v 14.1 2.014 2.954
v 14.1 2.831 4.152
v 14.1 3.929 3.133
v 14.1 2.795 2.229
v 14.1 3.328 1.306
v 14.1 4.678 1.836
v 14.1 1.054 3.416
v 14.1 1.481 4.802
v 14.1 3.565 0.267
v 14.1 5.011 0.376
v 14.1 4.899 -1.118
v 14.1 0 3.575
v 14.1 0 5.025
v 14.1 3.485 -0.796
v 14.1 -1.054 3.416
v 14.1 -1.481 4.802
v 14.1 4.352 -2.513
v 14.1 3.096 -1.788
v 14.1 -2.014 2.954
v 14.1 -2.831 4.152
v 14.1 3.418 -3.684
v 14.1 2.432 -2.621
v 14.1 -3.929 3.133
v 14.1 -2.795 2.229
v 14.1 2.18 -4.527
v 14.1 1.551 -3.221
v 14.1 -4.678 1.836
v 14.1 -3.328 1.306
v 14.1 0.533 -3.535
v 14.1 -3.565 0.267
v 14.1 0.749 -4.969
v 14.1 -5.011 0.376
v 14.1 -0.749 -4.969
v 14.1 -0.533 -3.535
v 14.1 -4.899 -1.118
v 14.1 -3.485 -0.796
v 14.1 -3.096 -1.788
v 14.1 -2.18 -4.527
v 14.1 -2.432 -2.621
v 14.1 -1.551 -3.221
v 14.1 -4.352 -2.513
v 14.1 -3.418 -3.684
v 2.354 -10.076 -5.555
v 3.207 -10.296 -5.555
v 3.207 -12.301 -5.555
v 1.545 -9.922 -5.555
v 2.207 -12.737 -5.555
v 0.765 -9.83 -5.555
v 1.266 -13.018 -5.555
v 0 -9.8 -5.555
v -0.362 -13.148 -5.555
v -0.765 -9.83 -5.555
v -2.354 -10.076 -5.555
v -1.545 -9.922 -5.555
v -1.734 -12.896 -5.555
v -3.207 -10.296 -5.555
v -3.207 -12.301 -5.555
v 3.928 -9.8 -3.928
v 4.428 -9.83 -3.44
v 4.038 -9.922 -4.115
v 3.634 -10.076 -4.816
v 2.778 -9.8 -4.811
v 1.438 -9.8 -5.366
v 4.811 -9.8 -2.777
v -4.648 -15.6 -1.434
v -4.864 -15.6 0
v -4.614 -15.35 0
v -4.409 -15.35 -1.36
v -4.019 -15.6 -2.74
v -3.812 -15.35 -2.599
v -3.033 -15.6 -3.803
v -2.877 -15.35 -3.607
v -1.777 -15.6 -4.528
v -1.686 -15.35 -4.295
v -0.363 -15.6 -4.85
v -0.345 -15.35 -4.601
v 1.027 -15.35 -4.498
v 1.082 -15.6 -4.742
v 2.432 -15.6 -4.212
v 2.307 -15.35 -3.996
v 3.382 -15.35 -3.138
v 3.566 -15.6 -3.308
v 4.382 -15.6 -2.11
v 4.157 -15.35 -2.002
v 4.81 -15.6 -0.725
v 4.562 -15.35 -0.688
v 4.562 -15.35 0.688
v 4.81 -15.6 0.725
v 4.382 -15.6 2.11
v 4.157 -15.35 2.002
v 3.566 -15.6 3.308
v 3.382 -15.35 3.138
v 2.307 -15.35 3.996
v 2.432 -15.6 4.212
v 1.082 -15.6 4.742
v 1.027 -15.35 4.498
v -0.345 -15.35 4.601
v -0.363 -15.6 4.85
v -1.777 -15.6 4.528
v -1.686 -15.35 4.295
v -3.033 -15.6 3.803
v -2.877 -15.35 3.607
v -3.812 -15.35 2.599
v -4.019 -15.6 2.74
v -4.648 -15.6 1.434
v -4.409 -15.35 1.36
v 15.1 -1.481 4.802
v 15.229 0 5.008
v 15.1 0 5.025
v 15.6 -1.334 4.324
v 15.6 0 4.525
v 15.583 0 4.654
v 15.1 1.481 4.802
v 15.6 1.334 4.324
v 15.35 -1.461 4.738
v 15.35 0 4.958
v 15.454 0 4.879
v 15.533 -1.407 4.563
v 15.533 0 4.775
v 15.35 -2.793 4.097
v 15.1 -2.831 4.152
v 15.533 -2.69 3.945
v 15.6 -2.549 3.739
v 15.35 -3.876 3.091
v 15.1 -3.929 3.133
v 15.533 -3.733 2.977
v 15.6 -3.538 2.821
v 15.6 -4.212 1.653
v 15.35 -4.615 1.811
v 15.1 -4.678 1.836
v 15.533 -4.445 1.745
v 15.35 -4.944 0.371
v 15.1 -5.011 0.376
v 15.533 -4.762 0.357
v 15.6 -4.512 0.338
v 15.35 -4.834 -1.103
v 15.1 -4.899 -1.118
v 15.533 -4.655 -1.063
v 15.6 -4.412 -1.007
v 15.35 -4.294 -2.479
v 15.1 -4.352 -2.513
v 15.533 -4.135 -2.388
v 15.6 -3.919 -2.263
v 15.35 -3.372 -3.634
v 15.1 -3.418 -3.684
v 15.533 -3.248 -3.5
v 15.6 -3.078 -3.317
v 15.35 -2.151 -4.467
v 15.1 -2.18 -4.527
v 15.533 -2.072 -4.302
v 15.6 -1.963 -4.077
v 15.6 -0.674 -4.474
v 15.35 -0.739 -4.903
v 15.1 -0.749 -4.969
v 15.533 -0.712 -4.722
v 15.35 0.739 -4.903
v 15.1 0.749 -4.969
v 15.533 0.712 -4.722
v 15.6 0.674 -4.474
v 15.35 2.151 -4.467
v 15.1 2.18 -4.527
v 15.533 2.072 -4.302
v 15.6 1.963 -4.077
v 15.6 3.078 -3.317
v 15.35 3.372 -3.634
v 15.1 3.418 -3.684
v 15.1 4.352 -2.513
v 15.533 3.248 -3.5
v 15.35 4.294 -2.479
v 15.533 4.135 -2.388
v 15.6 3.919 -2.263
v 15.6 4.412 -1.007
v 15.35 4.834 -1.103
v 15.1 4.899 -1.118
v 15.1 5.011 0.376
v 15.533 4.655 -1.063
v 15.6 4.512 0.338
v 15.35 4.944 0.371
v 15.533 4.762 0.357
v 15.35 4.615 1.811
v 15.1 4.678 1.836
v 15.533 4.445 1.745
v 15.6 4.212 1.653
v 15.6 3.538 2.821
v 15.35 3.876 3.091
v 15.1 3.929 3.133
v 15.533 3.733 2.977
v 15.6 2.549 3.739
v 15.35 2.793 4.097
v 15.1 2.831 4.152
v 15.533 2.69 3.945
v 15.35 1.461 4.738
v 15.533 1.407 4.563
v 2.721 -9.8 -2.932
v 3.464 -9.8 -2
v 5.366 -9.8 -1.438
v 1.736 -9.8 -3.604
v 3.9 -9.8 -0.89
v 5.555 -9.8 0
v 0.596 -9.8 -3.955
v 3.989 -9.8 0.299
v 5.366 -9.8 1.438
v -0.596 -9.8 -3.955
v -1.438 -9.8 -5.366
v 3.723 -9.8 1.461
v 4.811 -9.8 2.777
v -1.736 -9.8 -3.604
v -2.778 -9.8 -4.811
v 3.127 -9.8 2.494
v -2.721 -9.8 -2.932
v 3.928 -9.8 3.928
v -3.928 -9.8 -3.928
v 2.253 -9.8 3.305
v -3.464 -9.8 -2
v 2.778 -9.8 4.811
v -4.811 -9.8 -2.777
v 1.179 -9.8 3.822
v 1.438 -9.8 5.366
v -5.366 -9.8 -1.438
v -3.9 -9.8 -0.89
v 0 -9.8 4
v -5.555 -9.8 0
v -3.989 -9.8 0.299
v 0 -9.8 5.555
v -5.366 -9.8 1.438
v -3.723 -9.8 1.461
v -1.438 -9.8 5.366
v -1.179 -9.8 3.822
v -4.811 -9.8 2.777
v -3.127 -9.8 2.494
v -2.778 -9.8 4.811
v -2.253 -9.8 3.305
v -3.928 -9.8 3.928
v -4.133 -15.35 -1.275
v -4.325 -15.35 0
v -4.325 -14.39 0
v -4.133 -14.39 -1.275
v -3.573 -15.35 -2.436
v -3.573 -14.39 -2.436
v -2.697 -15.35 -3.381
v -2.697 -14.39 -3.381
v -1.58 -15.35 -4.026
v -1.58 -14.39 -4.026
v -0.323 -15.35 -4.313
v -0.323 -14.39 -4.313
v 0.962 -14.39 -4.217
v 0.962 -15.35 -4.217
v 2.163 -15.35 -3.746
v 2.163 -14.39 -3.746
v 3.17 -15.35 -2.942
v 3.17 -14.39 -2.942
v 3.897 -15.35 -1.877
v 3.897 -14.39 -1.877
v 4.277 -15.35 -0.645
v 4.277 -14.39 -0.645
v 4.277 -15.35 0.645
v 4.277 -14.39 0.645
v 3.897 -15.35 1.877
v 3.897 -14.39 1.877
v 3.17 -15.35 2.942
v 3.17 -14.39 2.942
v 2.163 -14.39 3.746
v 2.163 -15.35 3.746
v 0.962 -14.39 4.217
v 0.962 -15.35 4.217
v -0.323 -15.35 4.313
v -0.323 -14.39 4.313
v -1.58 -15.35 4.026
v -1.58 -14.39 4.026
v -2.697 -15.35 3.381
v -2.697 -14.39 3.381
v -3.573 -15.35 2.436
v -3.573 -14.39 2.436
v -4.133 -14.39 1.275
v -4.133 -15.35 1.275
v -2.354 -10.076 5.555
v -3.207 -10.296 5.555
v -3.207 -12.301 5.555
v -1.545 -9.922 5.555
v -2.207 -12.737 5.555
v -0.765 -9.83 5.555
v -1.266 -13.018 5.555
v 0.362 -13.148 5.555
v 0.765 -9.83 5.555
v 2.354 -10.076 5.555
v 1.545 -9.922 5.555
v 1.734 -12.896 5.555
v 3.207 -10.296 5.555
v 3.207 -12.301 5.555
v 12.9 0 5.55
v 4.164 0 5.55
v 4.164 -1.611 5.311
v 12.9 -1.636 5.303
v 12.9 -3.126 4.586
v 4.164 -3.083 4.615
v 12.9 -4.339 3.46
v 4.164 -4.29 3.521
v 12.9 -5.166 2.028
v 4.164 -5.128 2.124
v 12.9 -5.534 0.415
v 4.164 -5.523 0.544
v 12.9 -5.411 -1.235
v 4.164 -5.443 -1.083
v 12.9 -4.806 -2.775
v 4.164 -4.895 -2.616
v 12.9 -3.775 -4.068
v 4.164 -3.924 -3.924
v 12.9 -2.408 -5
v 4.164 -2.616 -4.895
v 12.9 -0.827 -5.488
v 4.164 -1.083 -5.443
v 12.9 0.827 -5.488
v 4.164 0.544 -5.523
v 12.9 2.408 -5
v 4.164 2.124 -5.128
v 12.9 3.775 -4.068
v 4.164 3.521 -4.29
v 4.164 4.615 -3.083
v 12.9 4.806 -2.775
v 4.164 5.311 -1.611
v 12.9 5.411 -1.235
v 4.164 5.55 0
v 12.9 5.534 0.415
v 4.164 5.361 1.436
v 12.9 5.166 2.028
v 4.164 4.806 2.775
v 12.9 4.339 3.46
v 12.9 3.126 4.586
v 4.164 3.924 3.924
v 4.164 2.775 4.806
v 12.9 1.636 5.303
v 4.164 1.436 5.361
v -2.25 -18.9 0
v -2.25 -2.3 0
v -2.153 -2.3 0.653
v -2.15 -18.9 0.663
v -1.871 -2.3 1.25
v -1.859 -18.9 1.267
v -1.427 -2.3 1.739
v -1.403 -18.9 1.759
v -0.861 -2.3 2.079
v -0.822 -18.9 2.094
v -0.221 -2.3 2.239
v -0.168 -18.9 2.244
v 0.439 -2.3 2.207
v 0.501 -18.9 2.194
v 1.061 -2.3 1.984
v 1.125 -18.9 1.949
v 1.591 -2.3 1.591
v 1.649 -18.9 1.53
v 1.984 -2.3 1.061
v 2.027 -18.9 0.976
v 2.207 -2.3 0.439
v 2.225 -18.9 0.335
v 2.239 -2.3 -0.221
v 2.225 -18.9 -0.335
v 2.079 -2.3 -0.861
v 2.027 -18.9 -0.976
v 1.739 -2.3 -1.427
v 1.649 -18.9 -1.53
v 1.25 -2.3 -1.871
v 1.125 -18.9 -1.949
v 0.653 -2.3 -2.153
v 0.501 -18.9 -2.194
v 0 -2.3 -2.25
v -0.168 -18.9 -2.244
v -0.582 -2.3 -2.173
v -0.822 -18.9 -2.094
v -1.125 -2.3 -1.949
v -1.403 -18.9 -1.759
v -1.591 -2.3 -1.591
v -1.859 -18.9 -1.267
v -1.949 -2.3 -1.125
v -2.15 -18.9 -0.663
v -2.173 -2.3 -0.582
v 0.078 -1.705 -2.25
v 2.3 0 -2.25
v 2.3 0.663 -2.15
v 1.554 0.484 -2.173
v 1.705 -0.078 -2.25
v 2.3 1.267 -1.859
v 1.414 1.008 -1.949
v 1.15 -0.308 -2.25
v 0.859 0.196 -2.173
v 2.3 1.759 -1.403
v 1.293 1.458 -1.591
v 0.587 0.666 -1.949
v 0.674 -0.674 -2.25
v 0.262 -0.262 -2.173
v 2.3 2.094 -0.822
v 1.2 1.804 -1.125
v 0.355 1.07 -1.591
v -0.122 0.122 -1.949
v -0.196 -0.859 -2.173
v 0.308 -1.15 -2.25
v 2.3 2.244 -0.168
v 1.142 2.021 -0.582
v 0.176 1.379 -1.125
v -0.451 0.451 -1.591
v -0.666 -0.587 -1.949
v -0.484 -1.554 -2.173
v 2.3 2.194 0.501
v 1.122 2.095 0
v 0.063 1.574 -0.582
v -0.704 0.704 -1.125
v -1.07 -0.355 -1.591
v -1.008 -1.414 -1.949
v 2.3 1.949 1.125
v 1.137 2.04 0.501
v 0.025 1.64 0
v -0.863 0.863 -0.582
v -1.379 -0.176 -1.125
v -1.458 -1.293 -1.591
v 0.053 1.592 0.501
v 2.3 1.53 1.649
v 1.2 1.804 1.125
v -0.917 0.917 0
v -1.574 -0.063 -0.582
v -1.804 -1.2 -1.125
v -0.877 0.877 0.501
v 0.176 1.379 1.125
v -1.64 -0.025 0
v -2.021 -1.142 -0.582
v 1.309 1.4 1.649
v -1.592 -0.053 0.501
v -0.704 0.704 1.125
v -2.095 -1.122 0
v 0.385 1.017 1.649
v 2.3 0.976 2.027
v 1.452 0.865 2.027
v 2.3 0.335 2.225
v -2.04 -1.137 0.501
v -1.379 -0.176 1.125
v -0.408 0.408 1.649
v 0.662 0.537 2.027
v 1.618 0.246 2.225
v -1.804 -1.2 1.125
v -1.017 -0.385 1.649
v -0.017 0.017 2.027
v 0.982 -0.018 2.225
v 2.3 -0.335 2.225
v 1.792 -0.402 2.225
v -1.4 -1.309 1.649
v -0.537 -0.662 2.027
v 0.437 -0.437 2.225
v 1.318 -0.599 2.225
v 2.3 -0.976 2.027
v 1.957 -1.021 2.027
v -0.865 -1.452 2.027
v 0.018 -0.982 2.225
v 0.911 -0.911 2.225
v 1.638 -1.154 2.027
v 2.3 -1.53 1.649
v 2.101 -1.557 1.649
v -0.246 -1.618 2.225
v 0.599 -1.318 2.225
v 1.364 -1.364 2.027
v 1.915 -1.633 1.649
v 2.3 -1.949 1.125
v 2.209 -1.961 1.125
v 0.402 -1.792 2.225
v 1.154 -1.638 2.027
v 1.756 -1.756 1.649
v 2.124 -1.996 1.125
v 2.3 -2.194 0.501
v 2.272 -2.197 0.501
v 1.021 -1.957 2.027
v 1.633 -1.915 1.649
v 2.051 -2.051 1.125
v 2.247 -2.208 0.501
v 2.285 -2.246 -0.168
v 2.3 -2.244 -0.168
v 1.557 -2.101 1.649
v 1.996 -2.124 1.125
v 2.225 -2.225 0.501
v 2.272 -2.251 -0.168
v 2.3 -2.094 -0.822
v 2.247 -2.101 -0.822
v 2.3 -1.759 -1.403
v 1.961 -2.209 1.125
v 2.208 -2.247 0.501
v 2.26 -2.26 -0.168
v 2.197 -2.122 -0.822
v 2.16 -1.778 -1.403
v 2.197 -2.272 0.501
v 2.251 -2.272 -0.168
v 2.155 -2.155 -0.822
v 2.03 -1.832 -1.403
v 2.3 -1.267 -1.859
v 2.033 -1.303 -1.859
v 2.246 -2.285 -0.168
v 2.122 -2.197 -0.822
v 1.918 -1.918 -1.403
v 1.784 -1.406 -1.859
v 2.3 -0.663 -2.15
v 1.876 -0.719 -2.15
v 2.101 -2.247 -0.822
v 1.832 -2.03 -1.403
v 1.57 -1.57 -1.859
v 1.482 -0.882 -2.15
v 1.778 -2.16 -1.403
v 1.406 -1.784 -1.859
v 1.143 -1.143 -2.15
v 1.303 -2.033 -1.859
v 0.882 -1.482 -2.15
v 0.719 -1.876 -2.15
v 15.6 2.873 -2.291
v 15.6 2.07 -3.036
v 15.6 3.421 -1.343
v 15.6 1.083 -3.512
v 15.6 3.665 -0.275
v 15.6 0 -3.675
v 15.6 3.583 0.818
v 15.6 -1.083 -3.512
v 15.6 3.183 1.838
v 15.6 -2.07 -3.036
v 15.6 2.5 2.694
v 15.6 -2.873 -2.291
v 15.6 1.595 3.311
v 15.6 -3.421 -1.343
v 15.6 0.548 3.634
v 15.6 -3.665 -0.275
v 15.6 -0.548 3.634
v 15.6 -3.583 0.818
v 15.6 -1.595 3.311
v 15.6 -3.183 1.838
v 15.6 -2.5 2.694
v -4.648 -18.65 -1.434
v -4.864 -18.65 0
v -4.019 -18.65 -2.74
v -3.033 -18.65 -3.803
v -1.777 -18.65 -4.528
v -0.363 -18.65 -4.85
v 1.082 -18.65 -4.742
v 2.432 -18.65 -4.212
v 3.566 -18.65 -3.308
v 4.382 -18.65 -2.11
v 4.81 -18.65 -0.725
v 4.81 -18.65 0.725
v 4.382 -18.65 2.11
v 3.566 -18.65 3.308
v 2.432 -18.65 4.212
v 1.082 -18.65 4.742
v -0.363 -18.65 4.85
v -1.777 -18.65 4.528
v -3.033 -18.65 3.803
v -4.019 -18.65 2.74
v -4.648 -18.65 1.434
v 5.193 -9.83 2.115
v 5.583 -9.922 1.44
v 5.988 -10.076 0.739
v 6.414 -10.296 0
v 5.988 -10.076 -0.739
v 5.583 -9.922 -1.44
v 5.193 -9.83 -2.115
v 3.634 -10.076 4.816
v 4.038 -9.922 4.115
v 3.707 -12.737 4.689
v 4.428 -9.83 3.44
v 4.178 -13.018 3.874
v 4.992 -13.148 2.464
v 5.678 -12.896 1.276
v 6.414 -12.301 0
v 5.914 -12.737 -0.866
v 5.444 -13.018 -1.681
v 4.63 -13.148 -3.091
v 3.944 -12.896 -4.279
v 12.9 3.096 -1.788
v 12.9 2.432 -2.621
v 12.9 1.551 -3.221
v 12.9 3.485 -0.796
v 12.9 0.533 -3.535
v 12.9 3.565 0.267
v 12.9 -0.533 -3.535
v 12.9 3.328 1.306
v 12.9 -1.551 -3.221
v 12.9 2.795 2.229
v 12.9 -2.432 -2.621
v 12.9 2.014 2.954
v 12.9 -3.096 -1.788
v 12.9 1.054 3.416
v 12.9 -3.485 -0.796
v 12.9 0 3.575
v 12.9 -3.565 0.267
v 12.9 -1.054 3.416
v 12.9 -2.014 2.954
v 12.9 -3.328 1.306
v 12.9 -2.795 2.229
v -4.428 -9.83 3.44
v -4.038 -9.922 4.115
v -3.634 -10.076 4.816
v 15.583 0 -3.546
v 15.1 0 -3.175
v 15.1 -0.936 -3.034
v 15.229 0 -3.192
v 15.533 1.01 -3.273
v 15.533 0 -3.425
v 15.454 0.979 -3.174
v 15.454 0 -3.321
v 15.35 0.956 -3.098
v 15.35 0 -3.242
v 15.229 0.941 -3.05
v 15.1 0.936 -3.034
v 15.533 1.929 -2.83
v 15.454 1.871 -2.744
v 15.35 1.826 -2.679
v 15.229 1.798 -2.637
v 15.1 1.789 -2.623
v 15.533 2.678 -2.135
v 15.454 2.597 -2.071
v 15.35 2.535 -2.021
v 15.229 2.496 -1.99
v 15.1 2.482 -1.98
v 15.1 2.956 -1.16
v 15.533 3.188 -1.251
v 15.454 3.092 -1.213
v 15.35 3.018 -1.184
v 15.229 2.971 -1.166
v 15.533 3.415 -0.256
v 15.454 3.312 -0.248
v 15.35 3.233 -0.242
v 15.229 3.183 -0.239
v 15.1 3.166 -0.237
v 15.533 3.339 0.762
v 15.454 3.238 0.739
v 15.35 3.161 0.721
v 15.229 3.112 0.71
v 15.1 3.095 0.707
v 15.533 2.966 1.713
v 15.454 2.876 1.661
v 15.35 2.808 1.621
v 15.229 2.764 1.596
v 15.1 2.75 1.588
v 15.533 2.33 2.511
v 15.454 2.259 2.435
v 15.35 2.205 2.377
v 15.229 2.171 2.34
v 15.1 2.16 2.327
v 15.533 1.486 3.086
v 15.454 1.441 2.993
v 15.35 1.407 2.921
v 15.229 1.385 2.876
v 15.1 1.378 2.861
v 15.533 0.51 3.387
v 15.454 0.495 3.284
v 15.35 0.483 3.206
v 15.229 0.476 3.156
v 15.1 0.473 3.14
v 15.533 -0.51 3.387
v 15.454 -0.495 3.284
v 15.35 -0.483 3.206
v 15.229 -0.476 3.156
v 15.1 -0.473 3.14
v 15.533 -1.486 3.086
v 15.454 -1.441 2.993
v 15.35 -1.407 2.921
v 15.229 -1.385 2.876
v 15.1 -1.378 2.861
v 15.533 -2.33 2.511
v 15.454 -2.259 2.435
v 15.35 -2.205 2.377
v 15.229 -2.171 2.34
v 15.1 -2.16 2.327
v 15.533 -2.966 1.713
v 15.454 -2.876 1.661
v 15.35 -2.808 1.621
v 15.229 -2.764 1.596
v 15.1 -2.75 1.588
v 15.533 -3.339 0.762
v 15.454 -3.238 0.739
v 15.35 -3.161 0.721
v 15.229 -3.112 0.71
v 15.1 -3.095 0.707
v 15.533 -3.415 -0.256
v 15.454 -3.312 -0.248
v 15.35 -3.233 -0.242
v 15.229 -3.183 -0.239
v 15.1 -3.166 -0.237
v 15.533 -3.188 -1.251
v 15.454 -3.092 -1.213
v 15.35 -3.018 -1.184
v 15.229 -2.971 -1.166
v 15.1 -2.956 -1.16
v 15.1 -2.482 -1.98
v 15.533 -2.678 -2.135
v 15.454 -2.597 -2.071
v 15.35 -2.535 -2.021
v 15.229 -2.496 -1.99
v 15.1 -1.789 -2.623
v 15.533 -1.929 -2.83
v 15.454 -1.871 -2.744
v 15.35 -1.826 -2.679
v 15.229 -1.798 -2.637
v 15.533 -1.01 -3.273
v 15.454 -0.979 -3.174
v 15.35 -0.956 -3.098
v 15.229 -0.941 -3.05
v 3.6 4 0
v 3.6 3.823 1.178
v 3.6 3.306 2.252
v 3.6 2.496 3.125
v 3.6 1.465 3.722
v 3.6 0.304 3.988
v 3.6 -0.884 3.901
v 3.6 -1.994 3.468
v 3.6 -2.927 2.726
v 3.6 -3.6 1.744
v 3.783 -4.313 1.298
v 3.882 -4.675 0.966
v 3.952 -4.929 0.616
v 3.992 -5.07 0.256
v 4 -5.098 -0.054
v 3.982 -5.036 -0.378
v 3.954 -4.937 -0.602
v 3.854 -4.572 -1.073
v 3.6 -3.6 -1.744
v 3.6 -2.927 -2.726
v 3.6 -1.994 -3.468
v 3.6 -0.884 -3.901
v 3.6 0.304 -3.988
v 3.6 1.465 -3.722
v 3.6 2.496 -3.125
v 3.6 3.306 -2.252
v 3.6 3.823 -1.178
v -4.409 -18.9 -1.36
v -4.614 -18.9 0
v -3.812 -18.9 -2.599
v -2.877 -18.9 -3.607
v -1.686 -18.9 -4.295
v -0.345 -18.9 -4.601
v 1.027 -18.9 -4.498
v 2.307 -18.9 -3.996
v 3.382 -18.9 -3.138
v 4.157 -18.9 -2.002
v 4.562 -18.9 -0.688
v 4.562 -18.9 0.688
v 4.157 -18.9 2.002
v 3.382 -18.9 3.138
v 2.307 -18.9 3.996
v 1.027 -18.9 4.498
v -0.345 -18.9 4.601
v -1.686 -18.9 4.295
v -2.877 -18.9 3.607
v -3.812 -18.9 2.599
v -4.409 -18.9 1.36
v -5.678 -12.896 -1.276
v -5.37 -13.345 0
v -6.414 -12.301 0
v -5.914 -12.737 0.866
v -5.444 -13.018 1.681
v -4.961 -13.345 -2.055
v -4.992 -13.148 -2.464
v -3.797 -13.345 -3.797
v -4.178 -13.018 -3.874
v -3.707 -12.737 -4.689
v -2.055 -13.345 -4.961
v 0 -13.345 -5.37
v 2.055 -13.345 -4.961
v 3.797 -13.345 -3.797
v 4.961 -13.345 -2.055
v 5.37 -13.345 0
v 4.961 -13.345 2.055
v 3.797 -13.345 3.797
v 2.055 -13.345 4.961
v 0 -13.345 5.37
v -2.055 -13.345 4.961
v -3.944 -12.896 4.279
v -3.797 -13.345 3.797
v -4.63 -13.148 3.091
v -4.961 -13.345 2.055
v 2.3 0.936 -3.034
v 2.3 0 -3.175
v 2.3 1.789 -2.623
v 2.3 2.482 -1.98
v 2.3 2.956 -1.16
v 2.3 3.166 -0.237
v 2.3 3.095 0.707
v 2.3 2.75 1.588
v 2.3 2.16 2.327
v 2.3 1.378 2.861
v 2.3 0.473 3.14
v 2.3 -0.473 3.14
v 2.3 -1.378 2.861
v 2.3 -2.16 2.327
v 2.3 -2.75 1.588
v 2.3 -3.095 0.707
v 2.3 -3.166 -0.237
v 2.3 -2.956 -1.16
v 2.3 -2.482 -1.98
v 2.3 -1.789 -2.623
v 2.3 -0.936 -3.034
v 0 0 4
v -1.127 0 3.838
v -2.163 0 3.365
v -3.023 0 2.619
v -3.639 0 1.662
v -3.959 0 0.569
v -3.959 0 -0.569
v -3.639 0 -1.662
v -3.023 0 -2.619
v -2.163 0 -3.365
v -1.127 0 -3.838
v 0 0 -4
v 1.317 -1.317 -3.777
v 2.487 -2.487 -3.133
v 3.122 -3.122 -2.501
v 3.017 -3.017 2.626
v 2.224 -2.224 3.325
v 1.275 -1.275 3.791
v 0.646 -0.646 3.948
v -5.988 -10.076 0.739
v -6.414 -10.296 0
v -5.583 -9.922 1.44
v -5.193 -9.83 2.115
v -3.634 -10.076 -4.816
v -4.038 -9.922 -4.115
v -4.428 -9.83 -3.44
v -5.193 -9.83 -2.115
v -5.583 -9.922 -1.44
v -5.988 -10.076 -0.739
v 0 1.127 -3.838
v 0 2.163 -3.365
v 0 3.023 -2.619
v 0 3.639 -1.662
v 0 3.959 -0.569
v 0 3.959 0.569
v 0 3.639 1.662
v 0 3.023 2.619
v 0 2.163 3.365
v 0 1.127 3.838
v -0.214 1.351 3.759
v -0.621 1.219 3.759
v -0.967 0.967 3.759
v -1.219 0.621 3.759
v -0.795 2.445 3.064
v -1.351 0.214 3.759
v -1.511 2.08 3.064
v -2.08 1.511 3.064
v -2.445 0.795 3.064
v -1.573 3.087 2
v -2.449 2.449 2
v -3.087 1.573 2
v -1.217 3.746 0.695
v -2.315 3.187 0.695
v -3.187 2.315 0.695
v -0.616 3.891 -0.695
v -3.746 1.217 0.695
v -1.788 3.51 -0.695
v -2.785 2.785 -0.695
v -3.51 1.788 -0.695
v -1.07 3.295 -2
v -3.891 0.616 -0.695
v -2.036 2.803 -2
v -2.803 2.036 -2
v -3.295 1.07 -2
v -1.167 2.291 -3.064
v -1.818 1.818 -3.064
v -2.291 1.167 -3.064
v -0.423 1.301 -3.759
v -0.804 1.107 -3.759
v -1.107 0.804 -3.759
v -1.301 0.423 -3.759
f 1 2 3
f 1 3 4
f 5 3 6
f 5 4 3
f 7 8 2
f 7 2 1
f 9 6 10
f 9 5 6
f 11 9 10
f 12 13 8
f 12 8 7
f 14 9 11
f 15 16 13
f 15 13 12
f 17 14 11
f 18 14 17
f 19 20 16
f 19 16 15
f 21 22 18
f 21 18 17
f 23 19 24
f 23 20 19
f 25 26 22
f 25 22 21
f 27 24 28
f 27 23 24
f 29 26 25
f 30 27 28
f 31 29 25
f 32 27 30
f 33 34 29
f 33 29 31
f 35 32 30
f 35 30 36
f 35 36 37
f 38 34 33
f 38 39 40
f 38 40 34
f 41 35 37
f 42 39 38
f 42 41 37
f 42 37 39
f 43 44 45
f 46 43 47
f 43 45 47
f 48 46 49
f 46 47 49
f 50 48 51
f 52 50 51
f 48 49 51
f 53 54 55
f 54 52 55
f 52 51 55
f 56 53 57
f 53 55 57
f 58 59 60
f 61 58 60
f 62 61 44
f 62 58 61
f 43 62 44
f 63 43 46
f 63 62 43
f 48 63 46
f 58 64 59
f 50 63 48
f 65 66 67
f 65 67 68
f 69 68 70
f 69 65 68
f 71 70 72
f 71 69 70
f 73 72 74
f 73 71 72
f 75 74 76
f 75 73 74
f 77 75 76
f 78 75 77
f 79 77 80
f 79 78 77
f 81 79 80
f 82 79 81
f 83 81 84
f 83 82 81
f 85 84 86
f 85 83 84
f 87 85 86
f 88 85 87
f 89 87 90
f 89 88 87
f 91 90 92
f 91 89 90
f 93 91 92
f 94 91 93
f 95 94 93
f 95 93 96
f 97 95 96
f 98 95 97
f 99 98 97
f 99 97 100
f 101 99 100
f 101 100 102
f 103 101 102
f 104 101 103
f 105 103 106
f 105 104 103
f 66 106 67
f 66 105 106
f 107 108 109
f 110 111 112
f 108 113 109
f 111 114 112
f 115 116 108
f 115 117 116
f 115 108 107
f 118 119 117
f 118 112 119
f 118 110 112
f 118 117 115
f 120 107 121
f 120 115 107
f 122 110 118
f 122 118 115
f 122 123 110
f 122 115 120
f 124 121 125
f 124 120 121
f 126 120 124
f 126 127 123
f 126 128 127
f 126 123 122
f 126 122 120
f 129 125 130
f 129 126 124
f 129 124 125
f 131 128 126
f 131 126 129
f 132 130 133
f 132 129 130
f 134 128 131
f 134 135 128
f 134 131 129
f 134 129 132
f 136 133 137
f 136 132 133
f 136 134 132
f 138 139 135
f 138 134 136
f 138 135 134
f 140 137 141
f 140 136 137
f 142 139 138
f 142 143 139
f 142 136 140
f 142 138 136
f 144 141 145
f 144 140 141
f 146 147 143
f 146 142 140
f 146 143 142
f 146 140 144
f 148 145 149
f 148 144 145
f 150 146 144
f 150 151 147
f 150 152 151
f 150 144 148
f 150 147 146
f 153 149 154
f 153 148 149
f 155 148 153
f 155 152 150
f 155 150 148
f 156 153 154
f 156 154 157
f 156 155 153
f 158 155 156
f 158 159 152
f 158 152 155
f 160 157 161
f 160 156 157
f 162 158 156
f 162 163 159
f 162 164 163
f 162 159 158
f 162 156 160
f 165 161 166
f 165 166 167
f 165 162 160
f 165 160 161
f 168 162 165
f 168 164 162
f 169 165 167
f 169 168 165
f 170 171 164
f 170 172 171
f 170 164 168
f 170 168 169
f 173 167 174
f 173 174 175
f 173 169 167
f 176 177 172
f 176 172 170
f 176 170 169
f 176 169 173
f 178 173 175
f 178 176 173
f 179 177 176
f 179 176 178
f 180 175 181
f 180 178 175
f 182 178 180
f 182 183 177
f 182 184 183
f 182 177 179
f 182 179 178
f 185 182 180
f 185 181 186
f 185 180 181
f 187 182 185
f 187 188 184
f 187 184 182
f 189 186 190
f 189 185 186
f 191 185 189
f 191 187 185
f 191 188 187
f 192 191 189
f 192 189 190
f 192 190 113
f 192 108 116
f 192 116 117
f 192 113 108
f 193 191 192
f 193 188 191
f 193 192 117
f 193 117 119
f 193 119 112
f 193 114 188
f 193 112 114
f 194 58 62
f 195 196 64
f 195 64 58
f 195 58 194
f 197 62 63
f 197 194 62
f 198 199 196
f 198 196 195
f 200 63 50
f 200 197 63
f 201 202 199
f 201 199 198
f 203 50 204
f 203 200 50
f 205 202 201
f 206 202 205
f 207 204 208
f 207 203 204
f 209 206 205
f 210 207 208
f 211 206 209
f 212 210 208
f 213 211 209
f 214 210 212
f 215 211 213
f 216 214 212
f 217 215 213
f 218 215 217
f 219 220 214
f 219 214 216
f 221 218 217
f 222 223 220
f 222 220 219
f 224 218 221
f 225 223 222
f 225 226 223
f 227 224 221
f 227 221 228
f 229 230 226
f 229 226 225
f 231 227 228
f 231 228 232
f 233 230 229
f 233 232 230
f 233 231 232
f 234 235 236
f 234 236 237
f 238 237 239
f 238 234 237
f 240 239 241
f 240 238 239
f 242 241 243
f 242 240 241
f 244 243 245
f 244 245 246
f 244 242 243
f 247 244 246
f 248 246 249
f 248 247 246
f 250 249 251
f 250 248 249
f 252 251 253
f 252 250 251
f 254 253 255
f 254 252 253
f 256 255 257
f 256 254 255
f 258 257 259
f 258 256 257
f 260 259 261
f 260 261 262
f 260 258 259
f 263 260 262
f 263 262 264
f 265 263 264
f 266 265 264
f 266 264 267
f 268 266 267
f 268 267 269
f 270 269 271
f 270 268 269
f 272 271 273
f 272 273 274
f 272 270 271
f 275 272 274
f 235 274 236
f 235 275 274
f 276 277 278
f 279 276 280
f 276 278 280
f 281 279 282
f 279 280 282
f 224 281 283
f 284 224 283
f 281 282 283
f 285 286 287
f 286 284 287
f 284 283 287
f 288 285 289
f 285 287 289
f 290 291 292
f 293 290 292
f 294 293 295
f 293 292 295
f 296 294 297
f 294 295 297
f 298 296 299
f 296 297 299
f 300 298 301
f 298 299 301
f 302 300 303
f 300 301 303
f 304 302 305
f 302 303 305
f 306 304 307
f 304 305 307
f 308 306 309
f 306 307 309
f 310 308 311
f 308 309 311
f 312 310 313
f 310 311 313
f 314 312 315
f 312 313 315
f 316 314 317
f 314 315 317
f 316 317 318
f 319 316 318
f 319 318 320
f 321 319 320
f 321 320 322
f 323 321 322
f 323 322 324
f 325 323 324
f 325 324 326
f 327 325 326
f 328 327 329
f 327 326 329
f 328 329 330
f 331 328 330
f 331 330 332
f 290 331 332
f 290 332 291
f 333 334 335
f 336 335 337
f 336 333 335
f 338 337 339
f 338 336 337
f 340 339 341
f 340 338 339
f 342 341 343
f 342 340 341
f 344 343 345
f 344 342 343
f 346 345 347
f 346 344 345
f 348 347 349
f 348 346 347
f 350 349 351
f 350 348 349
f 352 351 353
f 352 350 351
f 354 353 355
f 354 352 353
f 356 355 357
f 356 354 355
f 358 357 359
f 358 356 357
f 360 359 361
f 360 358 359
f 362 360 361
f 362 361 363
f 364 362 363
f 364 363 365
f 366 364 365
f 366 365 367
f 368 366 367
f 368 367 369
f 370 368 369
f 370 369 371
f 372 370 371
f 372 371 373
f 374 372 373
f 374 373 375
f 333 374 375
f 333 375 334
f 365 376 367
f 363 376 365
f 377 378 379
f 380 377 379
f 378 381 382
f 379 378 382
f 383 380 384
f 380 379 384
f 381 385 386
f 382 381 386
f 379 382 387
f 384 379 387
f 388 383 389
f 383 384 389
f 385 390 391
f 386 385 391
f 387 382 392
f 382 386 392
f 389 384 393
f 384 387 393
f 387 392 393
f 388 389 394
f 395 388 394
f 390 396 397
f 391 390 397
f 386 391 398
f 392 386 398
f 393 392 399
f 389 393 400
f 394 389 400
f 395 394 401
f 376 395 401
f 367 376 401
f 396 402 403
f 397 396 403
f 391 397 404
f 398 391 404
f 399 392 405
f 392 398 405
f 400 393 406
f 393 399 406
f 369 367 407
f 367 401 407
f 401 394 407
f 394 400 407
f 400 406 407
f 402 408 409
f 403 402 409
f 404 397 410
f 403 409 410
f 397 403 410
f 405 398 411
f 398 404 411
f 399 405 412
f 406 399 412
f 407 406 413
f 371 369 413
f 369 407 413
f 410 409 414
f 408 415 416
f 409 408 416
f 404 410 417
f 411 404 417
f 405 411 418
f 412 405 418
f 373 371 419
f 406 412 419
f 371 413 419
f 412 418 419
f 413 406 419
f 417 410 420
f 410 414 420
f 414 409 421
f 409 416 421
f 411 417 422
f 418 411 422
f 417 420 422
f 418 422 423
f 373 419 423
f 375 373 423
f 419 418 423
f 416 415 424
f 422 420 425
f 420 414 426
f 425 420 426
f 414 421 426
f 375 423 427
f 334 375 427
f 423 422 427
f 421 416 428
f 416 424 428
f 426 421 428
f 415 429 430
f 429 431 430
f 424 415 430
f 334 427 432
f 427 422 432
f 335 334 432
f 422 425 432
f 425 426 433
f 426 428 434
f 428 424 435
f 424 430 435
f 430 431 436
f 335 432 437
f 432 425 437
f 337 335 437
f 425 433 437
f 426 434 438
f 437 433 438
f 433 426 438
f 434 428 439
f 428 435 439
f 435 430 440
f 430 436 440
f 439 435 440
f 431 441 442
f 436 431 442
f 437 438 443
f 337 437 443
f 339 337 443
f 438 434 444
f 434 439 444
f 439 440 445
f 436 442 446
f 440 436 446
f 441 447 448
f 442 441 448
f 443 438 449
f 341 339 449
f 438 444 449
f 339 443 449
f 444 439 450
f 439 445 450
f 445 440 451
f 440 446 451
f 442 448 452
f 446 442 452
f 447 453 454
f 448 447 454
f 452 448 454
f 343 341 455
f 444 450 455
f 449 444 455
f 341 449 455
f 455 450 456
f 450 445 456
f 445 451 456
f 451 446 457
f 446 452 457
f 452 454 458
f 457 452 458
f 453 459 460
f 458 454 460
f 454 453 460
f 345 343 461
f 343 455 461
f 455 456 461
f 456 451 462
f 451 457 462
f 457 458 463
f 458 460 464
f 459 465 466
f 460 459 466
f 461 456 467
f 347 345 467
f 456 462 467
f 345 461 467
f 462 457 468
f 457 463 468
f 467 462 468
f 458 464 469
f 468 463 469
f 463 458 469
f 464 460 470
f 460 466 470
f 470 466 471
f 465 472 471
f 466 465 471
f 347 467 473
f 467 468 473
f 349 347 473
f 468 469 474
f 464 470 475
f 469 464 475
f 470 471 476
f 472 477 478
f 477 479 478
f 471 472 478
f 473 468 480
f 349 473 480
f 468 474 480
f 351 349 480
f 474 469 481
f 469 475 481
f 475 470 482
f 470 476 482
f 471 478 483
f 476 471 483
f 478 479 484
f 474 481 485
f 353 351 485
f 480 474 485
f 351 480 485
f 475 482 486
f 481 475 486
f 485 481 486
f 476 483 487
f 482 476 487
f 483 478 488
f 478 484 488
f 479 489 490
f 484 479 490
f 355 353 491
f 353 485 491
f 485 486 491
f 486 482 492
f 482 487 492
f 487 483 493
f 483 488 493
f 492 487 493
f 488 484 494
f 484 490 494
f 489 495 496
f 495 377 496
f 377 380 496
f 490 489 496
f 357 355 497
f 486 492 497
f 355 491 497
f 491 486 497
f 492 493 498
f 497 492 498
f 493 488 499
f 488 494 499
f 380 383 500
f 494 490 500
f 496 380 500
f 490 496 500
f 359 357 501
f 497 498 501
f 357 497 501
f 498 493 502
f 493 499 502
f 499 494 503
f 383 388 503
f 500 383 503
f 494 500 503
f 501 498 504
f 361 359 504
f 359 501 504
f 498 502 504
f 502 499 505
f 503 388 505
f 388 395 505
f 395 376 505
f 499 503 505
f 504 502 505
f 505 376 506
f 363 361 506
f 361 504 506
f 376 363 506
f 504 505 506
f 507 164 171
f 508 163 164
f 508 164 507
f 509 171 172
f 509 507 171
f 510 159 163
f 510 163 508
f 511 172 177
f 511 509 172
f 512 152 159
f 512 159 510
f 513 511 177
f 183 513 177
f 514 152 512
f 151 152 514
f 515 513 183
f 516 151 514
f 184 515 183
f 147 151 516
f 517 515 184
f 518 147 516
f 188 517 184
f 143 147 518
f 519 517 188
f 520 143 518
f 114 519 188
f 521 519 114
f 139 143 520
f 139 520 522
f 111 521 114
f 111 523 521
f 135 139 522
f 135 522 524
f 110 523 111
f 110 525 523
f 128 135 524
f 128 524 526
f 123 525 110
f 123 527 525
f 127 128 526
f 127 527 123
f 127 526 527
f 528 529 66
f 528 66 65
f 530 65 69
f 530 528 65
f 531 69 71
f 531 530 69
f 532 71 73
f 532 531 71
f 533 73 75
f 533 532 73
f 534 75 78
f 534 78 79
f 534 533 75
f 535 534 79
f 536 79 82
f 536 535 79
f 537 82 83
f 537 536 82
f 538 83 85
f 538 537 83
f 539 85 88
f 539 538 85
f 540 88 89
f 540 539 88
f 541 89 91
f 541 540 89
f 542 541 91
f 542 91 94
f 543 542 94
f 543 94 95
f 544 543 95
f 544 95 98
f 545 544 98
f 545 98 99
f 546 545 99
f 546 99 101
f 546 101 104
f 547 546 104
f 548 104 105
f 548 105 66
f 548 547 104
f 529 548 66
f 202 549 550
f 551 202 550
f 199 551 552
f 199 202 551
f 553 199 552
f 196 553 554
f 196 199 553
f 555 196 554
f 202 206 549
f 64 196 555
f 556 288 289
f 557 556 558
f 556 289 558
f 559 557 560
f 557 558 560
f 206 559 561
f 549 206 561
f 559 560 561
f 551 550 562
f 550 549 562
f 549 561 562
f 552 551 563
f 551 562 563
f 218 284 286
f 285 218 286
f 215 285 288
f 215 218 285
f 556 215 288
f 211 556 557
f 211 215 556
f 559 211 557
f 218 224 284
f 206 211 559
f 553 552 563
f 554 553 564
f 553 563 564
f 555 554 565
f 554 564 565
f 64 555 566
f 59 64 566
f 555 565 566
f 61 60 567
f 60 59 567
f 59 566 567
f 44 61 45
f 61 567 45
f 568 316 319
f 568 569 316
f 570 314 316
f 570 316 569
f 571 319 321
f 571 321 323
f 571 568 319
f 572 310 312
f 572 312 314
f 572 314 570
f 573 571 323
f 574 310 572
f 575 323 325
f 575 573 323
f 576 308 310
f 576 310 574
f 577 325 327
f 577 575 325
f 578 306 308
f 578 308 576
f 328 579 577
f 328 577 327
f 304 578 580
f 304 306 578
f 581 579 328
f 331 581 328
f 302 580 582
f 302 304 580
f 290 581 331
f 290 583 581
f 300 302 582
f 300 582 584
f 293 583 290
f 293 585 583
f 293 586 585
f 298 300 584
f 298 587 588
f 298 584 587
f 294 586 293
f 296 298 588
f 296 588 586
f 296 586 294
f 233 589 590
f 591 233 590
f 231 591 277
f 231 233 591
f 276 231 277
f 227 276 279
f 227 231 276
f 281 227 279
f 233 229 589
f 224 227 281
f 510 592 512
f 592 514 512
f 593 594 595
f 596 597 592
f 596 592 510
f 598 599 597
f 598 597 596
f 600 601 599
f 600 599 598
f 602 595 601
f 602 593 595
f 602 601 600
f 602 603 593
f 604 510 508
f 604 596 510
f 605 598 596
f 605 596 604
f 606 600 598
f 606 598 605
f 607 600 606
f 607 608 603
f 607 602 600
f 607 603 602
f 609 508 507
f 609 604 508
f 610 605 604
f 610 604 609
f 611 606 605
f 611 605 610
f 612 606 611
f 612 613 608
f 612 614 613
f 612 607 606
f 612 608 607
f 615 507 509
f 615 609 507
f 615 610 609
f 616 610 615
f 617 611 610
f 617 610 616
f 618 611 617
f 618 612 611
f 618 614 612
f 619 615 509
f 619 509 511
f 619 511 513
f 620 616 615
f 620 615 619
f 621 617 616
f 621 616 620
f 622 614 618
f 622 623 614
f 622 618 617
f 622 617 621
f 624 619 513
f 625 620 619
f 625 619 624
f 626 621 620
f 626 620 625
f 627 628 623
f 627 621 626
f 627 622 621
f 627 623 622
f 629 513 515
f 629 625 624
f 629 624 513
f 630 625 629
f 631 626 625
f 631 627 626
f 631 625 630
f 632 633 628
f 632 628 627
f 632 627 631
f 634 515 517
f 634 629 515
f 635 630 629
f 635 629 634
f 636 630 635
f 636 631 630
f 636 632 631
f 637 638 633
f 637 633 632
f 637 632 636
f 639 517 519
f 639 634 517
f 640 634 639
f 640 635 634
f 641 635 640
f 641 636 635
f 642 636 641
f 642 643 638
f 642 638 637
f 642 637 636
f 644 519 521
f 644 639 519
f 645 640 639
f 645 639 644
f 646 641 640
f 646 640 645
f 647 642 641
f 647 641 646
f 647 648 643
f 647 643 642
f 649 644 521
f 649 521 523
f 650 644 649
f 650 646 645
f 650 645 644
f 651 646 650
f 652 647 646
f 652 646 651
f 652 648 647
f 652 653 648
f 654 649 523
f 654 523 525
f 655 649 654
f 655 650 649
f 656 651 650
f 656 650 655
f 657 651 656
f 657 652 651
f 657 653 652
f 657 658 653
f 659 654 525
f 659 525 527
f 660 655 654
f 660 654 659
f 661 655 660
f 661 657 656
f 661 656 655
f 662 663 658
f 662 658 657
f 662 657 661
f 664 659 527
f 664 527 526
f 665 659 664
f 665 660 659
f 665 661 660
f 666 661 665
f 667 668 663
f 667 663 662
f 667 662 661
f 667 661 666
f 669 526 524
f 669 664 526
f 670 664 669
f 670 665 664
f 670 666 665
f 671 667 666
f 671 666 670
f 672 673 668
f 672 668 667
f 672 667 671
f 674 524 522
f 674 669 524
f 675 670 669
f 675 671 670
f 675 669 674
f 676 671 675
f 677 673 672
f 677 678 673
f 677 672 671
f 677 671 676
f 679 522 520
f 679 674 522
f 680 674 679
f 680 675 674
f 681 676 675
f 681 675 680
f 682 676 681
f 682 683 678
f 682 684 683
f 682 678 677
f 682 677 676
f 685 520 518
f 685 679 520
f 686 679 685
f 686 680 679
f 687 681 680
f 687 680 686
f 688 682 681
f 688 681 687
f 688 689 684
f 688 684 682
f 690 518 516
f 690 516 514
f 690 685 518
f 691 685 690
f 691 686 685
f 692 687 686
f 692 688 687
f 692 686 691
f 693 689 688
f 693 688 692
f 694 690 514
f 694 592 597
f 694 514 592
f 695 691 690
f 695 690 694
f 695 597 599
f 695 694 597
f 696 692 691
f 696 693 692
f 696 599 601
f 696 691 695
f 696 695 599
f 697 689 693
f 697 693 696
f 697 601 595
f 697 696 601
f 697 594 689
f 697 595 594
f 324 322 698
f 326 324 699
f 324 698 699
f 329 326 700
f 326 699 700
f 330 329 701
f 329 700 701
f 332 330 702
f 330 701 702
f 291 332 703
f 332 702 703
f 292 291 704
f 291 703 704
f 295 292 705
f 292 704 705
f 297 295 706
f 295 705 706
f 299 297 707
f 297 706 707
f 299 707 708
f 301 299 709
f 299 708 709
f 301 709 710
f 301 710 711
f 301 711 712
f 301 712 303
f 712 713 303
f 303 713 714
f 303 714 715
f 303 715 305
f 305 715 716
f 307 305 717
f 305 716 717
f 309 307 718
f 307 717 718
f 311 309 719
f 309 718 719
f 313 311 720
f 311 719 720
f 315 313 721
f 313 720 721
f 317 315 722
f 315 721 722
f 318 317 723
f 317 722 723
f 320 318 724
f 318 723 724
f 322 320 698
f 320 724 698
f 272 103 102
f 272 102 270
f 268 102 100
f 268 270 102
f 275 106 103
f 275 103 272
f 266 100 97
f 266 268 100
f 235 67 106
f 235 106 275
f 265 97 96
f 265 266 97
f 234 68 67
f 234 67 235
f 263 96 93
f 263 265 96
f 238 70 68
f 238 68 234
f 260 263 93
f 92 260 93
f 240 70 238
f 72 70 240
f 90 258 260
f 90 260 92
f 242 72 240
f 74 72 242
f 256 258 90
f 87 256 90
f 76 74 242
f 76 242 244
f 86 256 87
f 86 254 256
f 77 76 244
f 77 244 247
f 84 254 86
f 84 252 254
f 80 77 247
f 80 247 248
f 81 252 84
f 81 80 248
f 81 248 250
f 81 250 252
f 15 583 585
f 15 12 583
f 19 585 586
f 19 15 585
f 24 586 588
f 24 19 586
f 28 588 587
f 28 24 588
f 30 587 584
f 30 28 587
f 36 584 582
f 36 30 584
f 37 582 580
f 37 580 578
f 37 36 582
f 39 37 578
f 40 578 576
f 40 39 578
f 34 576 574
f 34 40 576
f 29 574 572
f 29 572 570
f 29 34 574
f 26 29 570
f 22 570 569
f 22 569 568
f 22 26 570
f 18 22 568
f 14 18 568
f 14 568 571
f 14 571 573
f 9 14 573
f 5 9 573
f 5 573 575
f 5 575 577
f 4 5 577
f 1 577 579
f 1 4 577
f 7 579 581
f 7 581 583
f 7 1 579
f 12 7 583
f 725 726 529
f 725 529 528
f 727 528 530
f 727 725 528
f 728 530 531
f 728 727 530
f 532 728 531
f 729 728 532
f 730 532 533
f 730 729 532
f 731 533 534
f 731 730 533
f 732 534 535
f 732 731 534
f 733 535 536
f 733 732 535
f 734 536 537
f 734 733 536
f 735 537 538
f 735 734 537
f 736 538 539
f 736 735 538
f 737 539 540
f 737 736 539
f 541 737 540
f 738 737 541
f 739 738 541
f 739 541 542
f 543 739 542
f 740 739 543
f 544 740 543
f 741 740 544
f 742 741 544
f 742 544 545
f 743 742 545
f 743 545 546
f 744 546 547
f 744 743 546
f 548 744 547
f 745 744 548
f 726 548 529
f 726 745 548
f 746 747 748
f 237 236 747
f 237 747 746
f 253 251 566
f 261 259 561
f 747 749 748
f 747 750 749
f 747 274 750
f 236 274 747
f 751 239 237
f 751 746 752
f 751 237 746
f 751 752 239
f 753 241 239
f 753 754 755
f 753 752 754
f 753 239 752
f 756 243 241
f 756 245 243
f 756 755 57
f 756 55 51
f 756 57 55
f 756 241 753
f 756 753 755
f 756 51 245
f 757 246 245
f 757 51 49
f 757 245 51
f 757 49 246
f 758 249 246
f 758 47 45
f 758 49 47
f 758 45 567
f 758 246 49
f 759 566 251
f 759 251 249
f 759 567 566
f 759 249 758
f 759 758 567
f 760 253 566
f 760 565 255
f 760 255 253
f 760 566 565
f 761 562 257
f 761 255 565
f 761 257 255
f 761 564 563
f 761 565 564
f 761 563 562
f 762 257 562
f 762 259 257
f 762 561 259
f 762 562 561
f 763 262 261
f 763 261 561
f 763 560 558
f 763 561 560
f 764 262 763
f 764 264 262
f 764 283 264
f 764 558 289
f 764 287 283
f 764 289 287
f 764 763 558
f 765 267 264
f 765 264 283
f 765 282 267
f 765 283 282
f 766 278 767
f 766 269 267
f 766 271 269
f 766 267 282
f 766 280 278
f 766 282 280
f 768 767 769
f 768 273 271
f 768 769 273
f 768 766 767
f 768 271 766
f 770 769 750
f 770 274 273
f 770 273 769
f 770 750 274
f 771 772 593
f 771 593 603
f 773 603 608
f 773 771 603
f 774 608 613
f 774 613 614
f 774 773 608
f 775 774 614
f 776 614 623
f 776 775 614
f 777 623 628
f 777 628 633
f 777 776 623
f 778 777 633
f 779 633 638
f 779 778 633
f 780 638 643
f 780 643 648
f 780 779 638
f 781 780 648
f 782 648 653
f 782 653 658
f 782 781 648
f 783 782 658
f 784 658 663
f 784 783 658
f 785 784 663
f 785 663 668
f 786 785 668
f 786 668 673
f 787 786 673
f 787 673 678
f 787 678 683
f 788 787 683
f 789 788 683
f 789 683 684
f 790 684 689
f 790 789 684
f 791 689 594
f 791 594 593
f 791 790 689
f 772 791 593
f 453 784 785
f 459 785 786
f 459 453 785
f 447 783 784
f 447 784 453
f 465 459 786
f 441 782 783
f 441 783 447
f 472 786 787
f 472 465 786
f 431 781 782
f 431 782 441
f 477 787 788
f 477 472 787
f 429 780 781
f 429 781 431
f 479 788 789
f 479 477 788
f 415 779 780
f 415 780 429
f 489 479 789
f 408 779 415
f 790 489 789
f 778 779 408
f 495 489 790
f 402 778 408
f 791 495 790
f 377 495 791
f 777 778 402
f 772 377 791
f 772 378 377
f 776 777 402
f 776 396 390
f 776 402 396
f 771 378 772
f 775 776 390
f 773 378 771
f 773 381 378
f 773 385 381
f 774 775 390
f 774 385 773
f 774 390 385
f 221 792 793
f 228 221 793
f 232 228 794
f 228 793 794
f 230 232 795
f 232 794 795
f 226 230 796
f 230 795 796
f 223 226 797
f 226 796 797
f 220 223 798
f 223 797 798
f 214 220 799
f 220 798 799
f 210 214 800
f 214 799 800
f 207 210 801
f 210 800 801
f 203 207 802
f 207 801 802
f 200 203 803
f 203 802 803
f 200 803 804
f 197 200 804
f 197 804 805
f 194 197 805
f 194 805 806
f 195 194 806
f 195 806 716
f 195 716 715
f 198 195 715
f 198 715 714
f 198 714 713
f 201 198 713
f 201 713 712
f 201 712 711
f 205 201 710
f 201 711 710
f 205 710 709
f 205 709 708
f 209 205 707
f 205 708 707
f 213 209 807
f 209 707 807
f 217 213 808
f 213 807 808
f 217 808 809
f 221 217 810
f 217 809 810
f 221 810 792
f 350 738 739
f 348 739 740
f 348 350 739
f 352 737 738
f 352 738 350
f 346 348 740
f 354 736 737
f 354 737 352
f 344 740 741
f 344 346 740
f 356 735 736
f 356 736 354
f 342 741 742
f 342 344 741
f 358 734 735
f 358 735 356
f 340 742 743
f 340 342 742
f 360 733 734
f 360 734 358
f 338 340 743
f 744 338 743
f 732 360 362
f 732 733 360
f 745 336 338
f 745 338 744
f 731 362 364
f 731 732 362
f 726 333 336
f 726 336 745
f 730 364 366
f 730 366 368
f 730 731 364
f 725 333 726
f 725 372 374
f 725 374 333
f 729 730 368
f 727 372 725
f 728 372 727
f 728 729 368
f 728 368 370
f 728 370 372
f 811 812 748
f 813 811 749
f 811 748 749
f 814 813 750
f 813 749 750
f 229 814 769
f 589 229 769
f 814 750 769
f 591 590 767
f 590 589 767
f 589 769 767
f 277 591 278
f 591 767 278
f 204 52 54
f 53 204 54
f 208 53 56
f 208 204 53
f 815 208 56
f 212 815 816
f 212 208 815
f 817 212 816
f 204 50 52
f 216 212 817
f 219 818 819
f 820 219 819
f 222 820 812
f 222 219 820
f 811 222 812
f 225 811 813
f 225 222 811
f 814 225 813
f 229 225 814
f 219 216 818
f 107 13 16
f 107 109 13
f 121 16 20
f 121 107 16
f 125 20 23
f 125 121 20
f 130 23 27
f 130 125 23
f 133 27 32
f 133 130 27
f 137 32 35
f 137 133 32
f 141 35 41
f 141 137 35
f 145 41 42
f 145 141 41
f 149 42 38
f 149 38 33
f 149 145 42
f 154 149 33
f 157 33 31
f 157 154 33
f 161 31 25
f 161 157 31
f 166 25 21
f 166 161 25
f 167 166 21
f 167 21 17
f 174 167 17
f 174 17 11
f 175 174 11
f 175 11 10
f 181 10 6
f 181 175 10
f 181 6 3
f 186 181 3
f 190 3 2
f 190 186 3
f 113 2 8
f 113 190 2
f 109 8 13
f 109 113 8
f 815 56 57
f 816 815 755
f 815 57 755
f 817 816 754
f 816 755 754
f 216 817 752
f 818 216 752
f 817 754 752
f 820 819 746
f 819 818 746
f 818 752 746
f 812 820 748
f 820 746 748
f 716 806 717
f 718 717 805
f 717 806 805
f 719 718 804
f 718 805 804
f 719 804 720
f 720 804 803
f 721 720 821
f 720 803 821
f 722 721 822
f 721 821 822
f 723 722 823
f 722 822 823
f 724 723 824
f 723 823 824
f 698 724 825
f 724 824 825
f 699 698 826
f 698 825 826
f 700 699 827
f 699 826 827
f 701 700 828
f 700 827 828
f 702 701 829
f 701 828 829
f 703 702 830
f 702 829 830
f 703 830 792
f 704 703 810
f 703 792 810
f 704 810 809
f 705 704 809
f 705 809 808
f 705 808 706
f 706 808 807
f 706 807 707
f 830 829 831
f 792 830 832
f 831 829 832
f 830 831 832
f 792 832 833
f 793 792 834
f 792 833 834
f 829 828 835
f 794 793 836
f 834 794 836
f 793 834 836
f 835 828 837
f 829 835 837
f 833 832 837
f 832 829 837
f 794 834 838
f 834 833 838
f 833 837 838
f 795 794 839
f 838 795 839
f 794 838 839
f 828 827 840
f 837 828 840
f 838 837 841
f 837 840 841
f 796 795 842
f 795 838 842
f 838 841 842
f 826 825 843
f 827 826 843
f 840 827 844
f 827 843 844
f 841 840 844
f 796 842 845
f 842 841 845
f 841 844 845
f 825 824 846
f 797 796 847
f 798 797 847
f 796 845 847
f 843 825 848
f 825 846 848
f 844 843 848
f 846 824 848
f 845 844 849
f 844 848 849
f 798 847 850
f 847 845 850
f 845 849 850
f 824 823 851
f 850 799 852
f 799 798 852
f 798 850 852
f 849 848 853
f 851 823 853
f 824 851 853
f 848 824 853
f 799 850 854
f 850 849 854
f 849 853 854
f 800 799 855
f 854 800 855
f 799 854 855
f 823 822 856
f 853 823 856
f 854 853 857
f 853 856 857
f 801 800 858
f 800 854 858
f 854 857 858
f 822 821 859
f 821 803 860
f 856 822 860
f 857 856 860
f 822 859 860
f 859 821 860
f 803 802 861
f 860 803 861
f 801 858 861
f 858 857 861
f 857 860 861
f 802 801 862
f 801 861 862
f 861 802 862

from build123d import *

# Parameters (mm, degrees)
SKETCH1_R             = 4
BASE_EXTRUDE_DEPTH    = 3.6
RBODY_SKETCH_R        = 5.55
RBODY_DEPTH           = 9.3
ELBOW_ANGLE           = 90
SKETCH3_R             = 4
BOSS_EXTRUDE1_DEPTH   = 9.8
NUT_DEPTH             = 4.59
THREAD_CHAMFER_SIZE   = 0.25
RTUBE_START           = -13.3
RTUBE_SKETCH_R        = 3.175
RTUBE_DEPTH           = 13.3
RTUBE_RADIUS_R        = 0.5
DIAMETER_R            = 2.25
PORT_THREADS_REACH    = 31.53
PORT_THREADS_SKETCH_R = 2.25


with BuildPart() as part:
    # Sketch1 → Base-Extrude (new body)
    with BuildSketch(Plane(origin=(0, 0, 0), x_dir=(0, 0, -1), z_dir=(1, 0, 0))):
        with Locations(Location((0, 0, 0), (0, 0, 180))):
            Circle(SKETCH1_R)
    extrude(amount=BASE_EXTRUDE_DEPTH)

    # RBody_Sketch → RBody (add)
    with BuildSketch(Plane(origin=(3.6, 0, 0), x_dir=(0, 0, -1), z_dir=(1, 0, 0))):
        with Locations(Location((0, 0, 0), (0, 0, 180))):
            Circle(RBODY_SKETCH_R)
    extrude(amount=RBODY_DEPTH)

    # RBody_Chamfer: read off the stored shape, not the designer's step
    # RBody_Chamfer outline → RBody_Chamfer (revolve, cut)
    with BuildSketch(Plane.YX):
        Polygon((5.55, 4.164153863), (4, 3.6), (5.55, 3.6), align=None)
    revolve(axis=Axis((0, 0, 0), (1, 0, 0)), mode=Mode.SUBTRACT)

    # RRelease_Sketch → RRelease (revolve)
    with BuildSketch(Plane.XY, mode=Mode.PRIVATE) as rrelease_sk:
        with BuildLine():
            Line((12.9, 3.575), (14.1, 3.575))
            Line((14.1, 3.575), (14.1, 5.025))
            Line((14.1, 5.025), (15.1, 5.025))
            ThreePointArc((15.1, 5.025), (15.453553391, 4.878553391), (15.6, 4.525))
            Line((15.6, 4.525), (15.6, 0))
            Line((15.6, 0), (12.9, 0))
            Line((12.9, 0), (12.9, 3.575))
        make_face()
    revolve(rrelease_sk.sketch.rotate(Axis((12.597722381, 0, 0), (1, 0, 0)), 90), axis=Axis((12.597722381, 0, 0), (1, 0, 0)))

    # Elbow_Sketch → Elbow (revolve)
    with BuildSketch(Plane.ZY):
        with BuildLine():
            Line((-4, 0), (4, 0))
            ThreePointArc((4, 0), (0, 4), (-4, 0))
        make_face()
    revolve(axis=Axis((0, 0, -6.487672297), (0, 0, 1)), revolution_arc=ELBOW_ANGLE)

    # Sketch3 → Boss-Extrude1 (add)
    with BuildSketch(Plane.XZ):
        with Locations(Location((0, 0, 0), (0, 0, 90))):
            Circle(SKETCH3_R)
    extrude(amount=BOSS_EXTRUDE1_DEPTH)

    # Nut_Sketch → Nut (add)
    with BuildSketch(Plane(origin=(0, -14.39, 0), x_dir=(-1, 0, 0), z_dir=(0, 1, 0))):
        Polygon((6.414361491, 0), (3.207180745, 5.555), (-3.207180745, 5.555), (-6.414361491, 0), (-3.207180745, -5.555), (3.207180745, -5.555), align=None)
    extrude(amount=NUT_DEPTH)

    # Nut_Chamfer_Sketch → Nut_Chamfer (revolve, cut)
    with BuildSketch(Plane.XY):
        Polygon((-5.555, -9.8), (-6.414361491, -9.8), (-6.414361491, -10.296152588), align=None)
        Polygon((-6.414361491, -13.893847412), (-5.555, -14.39), (-6.414361491, -14.39), align=None)
    revolve(axis=Axis((0, -1.551633987, 0), (0, 1, 0)), mode=Mode.SUBTRACT)

    # Thread_Sketch → Thread (revolve)
    with BuildSketch(Plane.XY):
        Polygon((0, -14.39), (-4.325, -14.39), (-4.325, -15.35), (-4.864, -15.35), (-4.864, -18.9), (0, -18.9), align=None)
    revolve(axis=Axis((0, 0, 0), (0, -1, 0)))

    # Thread_Chamfer
    thread_chamfer_edges = [part.edges().sort_by_distance(p)[0] for p in [
        (4.864, -18.9, 0),
        (4.864, -15.35, 0),
    ]]
    chamfer(thread_chamfer_edges, length=THREAD_CHAMFER_SIZE)

    # Sketch6 → Cut-Revolve1 (revolve, cut)
    with BuildSketch(Plane.XY):
        Polygon((-4.325, -14.39), (-6.414361491, -14.39), (-6.414361491, -12.300638509), align=None)
    revolve(axis=Axis((0, -7.772283854, 0), (0, -1, 0)), mode=Mode.SUBTRACT)

    # RTube_Sketch → RTube (cut)
    with BuildSketch(Plane(origin=(15.6, 0, 0), x_dir=(0, 0, -1), z_dir=(1, 0, 0)).offset(RTUBE_START)):
        Circle(RTUBE_SKETCH_R)
    extrude(amount=RTUBE_DEPTH, mode=Mode.SUBTRACT)

    # RTube_Radius
    rtube_radius_edges = [part.edges().sort_by_distance(p)[0] for p in [
        (15.6, 0, 3.175),
    ]]
    fillet(rtube_radius_edges, radius=RTUBE_RADIUS_R)

    # Port_Curve: sweep along a path in Profile
    with BuildLine(Plane.XY) as port_curve_path:
        ThreePointArc((2.3, 0), (0.673654403, -0.673654403), (0, -2.3))
    # Diameter → Port_Curve (sweep, cut)
    with BuildSketch(Plane(origin=(2.3, 0, 0), x_dir=(0, 0, -1), z_dir=(1, 0, 0))):
        Circle(DIAMETER_R)
    sweep(path=port_curve_path.line, mode=Mode.SUBTRACT)

    # Port_Threads_Sketch → Port_Threads (cut, up to next)
    with BuildSketch(Plane(origin=(0, -18.9, 0), x_dir=(-1, 0, 0), z_dir=(0, 1, 0)), mode=Mode.PRIVATE) as port_threads_sk1:
        Circle(PORT_THREADS_SKETCH_R)
    port_threads_tool1 = extrude(port_threads_sk1.sketch, amount=PORT_THREADS_REACH, mode=Mode.PRIVATE) & part.part
    add(port_threads_tool1.solids().sort_by_distance((0, -18.9, 0))[0], mode=Mode.SUBTRACT)


solid = part.part
